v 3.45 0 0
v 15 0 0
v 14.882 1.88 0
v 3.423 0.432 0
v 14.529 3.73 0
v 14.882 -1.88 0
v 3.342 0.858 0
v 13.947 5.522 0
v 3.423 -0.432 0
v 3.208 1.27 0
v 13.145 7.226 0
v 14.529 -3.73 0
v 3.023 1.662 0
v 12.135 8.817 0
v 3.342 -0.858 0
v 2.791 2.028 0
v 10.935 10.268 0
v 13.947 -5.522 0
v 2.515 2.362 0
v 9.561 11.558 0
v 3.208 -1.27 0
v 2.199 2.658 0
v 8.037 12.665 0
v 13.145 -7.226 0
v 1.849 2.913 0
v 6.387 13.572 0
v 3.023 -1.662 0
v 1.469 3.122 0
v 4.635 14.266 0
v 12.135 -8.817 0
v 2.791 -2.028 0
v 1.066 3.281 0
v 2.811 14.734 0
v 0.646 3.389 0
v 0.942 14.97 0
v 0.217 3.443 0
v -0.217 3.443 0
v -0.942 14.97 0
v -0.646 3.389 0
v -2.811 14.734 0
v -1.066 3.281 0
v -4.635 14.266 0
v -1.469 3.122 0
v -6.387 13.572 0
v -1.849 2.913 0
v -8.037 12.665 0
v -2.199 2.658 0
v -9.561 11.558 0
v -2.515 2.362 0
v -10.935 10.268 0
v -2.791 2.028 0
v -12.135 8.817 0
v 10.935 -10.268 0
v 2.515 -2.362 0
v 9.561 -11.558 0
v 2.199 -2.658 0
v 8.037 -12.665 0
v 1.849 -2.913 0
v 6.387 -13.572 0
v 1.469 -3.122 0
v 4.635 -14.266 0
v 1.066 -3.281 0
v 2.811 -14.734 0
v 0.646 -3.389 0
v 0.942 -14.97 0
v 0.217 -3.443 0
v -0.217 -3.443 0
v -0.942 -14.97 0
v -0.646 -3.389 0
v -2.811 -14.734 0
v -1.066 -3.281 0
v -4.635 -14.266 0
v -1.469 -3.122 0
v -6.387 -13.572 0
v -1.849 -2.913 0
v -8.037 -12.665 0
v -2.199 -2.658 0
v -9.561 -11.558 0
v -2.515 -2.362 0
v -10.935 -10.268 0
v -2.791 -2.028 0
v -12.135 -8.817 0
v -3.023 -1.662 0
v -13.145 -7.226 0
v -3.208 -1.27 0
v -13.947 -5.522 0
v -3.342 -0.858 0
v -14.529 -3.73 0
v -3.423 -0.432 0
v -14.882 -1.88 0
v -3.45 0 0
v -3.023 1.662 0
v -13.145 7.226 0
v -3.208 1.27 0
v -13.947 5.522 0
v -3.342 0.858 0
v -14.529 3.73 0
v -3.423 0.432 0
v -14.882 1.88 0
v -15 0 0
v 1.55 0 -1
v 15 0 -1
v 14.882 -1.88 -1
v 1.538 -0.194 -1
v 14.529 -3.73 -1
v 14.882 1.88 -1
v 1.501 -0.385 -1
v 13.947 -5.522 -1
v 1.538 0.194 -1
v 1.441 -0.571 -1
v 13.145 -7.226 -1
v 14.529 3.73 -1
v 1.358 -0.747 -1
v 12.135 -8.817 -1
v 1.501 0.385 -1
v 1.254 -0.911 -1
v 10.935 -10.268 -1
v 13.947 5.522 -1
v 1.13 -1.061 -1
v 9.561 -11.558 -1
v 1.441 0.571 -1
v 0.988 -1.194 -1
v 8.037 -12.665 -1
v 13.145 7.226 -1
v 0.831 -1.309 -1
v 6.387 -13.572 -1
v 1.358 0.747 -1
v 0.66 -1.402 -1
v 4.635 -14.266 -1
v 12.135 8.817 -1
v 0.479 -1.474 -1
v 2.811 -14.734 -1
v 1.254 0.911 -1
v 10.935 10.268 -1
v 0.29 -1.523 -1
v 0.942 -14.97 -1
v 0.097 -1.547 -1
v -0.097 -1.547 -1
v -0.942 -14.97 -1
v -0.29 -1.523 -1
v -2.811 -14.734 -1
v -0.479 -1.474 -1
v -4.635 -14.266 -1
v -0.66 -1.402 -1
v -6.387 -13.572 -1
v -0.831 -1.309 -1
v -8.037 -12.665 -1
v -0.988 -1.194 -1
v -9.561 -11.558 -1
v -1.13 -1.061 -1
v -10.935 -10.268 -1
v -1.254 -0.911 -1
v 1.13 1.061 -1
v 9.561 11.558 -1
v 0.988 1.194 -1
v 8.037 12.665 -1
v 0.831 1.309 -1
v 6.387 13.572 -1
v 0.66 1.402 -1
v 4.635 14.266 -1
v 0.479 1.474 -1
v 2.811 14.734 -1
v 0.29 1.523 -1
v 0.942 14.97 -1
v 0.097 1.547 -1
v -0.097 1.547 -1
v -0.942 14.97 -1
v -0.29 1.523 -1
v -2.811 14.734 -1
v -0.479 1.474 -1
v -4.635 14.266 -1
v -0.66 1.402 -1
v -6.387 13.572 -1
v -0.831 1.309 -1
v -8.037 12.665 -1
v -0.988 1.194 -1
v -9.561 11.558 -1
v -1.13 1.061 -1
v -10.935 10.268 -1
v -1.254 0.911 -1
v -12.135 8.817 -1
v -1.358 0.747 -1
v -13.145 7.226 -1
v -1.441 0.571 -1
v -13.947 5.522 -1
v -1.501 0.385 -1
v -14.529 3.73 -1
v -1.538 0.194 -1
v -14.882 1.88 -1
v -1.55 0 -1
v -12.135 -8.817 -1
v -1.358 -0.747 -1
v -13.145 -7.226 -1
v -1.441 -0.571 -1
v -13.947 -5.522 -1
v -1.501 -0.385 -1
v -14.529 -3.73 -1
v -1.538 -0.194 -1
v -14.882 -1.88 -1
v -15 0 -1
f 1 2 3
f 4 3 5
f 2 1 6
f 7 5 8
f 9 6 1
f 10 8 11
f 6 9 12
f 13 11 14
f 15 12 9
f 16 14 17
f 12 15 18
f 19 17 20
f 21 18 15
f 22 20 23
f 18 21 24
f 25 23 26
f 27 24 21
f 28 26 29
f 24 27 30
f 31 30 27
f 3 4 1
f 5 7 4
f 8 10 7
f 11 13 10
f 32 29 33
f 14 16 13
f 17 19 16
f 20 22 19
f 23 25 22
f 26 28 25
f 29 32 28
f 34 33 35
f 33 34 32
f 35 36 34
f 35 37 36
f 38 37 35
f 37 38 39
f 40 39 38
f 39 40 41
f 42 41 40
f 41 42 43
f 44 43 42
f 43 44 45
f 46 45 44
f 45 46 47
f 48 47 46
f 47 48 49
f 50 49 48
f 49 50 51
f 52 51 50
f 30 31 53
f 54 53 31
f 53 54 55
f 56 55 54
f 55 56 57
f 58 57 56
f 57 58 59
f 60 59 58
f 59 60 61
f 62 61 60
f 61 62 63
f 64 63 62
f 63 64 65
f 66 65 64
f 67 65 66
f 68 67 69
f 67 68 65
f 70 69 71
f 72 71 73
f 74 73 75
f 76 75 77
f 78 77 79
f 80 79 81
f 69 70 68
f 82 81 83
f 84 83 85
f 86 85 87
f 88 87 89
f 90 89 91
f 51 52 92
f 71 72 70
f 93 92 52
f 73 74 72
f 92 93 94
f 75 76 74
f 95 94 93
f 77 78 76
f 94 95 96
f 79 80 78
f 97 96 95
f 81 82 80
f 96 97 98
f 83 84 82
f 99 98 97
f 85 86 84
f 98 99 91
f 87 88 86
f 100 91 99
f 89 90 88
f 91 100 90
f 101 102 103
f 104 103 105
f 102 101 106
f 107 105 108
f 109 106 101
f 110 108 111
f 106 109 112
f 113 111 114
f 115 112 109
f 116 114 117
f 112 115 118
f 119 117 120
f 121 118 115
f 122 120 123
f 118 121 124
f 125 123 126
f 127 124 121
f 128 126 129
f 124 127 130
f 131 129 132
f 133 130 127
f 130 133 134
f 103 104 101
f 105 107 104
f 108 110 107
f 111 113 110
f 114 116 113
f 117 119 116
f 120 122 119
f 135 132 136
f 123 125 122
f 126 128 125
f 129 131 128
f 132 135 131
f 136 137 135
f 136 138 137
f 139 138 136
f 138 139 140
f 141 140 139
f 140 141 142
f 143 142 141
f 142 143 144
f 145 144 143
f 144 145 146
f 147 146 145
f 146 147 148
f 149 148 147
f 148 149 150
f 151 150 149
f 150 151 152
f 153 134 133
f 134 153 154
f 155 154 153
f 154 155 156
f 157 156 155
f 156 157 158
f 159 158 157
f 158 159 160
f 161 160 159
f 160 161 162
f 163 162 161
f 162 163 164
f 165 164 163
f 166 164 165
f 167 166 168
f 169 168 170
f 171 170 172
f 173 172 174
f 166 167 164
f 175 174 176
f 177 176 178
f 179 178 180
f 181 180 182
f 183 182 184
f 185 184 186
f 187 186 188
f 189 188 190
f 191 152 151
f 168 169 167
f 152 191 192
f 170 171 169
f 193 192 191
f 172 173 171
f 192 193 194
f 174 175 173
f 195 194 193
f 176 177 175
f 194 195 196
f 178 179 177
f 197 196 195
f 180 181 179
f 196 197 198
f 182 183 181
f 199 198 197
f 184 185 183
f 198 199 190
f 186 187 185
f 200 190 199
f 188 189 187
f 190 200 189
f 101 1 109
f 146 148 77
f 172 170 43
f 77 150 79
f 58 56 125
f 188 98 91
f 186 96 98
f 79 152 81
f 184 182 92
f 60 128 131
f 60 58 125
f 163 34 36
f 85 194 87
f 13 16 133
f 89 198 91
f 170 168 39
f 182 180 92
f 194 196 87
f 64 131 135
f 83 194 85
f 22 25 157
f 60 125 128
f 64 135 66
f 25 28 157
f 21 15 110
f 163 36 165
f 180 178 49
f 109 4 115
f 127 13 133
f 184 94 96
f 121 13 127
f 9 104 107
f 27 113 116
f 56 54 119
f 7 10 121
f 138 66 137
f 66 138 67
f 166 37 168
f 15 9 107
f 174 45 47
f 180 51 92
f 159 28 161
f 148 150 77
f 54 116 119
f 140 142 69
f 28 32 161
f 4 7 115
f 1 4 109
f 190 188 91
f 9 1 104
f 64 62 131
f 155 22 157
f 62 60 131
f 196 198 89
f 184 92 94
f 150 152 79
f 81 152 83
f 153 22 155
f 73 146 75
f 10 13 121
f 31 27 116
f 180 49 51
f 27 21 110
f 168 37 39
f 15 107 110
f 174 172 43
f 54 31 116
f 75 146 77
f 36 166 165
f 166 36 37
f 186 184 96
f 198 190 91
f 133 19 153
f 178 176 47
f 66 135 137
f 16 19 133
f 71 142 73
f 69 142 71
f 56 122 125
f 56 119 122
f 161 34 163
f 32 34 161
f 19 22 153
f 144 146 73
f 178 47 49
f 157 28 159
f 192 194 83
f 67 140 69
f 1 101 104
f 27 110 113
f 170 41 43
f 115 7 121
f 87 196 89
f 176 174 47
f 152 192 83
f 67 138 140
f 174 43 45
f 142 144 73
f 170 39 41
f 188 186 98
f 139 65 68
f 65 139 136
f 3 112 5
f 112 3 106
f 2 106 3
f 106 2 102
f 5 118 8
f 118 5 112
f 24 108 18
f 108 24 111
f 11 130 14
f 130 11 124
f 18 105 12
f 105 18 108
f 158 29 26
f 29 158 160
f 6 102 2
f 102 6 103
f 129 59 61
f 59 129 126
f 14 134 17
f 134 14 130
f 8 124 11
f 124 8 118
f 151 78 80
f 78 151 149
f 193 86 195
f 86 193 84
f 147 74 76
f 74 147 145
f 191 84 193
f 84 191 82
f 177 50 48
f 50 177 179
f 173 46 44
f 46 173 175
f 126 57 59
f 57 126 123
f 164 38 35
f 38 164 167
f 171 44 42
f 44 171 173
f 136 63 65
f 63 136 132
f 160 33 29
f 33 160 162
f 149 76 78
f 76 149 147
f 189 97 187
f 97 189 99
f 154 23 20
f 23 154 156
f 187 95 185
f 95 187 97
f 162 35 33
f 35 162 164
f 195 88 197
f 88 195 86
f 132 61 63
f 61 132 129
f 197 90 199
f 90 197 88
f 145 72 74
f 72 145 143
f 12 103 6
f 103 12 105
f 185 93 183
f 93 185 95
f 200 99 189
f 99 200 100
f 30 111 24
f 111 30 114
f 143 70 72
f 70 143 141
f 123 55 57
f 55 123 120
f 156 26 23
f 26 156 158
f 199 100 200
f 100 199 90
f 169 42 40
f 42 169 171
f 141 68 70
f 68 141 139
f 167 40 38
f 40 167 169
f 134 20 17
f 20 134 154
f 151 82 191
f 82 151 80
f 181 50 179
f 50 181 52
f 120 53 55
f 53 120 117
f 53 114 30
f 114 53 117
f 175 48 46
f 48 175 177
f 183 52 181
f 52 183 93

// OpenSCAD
$fn = 50;


difference() {
	union() {
		translate(v = [0, 0, -1.0000000000]) {
			cylinder(h = 1.0000000000, r = 15.0000000000);
		}
	}
	union() {
		translate(v = [0, 0, 0]) {
			rotate(a = [0, 0, 0]) {
				difference() {
					union() {
						translate(v = [0, 0, -1.0000000000]) {
							cylinder(h = 1.0000000000, r = 1.2500000000);
						}
						translate(v = [0, 0, -1.0000000000]) {
							cylinder(h = 1.0000000000, r1 = 1.5500000000, r2 = 3.4500000000);
						}
						translate(v = [0, 0, -1.0000000000]) {
							cylinder(h = 1.0000000000, r = 1.5500000000);
						}
						translate(v = [0, 0, -1.0000000000]) {
							cylinder(h = 1.0000000000, r = 1.2500000000);
						}
					}
					union();
				}
			}
		}
	}
}
